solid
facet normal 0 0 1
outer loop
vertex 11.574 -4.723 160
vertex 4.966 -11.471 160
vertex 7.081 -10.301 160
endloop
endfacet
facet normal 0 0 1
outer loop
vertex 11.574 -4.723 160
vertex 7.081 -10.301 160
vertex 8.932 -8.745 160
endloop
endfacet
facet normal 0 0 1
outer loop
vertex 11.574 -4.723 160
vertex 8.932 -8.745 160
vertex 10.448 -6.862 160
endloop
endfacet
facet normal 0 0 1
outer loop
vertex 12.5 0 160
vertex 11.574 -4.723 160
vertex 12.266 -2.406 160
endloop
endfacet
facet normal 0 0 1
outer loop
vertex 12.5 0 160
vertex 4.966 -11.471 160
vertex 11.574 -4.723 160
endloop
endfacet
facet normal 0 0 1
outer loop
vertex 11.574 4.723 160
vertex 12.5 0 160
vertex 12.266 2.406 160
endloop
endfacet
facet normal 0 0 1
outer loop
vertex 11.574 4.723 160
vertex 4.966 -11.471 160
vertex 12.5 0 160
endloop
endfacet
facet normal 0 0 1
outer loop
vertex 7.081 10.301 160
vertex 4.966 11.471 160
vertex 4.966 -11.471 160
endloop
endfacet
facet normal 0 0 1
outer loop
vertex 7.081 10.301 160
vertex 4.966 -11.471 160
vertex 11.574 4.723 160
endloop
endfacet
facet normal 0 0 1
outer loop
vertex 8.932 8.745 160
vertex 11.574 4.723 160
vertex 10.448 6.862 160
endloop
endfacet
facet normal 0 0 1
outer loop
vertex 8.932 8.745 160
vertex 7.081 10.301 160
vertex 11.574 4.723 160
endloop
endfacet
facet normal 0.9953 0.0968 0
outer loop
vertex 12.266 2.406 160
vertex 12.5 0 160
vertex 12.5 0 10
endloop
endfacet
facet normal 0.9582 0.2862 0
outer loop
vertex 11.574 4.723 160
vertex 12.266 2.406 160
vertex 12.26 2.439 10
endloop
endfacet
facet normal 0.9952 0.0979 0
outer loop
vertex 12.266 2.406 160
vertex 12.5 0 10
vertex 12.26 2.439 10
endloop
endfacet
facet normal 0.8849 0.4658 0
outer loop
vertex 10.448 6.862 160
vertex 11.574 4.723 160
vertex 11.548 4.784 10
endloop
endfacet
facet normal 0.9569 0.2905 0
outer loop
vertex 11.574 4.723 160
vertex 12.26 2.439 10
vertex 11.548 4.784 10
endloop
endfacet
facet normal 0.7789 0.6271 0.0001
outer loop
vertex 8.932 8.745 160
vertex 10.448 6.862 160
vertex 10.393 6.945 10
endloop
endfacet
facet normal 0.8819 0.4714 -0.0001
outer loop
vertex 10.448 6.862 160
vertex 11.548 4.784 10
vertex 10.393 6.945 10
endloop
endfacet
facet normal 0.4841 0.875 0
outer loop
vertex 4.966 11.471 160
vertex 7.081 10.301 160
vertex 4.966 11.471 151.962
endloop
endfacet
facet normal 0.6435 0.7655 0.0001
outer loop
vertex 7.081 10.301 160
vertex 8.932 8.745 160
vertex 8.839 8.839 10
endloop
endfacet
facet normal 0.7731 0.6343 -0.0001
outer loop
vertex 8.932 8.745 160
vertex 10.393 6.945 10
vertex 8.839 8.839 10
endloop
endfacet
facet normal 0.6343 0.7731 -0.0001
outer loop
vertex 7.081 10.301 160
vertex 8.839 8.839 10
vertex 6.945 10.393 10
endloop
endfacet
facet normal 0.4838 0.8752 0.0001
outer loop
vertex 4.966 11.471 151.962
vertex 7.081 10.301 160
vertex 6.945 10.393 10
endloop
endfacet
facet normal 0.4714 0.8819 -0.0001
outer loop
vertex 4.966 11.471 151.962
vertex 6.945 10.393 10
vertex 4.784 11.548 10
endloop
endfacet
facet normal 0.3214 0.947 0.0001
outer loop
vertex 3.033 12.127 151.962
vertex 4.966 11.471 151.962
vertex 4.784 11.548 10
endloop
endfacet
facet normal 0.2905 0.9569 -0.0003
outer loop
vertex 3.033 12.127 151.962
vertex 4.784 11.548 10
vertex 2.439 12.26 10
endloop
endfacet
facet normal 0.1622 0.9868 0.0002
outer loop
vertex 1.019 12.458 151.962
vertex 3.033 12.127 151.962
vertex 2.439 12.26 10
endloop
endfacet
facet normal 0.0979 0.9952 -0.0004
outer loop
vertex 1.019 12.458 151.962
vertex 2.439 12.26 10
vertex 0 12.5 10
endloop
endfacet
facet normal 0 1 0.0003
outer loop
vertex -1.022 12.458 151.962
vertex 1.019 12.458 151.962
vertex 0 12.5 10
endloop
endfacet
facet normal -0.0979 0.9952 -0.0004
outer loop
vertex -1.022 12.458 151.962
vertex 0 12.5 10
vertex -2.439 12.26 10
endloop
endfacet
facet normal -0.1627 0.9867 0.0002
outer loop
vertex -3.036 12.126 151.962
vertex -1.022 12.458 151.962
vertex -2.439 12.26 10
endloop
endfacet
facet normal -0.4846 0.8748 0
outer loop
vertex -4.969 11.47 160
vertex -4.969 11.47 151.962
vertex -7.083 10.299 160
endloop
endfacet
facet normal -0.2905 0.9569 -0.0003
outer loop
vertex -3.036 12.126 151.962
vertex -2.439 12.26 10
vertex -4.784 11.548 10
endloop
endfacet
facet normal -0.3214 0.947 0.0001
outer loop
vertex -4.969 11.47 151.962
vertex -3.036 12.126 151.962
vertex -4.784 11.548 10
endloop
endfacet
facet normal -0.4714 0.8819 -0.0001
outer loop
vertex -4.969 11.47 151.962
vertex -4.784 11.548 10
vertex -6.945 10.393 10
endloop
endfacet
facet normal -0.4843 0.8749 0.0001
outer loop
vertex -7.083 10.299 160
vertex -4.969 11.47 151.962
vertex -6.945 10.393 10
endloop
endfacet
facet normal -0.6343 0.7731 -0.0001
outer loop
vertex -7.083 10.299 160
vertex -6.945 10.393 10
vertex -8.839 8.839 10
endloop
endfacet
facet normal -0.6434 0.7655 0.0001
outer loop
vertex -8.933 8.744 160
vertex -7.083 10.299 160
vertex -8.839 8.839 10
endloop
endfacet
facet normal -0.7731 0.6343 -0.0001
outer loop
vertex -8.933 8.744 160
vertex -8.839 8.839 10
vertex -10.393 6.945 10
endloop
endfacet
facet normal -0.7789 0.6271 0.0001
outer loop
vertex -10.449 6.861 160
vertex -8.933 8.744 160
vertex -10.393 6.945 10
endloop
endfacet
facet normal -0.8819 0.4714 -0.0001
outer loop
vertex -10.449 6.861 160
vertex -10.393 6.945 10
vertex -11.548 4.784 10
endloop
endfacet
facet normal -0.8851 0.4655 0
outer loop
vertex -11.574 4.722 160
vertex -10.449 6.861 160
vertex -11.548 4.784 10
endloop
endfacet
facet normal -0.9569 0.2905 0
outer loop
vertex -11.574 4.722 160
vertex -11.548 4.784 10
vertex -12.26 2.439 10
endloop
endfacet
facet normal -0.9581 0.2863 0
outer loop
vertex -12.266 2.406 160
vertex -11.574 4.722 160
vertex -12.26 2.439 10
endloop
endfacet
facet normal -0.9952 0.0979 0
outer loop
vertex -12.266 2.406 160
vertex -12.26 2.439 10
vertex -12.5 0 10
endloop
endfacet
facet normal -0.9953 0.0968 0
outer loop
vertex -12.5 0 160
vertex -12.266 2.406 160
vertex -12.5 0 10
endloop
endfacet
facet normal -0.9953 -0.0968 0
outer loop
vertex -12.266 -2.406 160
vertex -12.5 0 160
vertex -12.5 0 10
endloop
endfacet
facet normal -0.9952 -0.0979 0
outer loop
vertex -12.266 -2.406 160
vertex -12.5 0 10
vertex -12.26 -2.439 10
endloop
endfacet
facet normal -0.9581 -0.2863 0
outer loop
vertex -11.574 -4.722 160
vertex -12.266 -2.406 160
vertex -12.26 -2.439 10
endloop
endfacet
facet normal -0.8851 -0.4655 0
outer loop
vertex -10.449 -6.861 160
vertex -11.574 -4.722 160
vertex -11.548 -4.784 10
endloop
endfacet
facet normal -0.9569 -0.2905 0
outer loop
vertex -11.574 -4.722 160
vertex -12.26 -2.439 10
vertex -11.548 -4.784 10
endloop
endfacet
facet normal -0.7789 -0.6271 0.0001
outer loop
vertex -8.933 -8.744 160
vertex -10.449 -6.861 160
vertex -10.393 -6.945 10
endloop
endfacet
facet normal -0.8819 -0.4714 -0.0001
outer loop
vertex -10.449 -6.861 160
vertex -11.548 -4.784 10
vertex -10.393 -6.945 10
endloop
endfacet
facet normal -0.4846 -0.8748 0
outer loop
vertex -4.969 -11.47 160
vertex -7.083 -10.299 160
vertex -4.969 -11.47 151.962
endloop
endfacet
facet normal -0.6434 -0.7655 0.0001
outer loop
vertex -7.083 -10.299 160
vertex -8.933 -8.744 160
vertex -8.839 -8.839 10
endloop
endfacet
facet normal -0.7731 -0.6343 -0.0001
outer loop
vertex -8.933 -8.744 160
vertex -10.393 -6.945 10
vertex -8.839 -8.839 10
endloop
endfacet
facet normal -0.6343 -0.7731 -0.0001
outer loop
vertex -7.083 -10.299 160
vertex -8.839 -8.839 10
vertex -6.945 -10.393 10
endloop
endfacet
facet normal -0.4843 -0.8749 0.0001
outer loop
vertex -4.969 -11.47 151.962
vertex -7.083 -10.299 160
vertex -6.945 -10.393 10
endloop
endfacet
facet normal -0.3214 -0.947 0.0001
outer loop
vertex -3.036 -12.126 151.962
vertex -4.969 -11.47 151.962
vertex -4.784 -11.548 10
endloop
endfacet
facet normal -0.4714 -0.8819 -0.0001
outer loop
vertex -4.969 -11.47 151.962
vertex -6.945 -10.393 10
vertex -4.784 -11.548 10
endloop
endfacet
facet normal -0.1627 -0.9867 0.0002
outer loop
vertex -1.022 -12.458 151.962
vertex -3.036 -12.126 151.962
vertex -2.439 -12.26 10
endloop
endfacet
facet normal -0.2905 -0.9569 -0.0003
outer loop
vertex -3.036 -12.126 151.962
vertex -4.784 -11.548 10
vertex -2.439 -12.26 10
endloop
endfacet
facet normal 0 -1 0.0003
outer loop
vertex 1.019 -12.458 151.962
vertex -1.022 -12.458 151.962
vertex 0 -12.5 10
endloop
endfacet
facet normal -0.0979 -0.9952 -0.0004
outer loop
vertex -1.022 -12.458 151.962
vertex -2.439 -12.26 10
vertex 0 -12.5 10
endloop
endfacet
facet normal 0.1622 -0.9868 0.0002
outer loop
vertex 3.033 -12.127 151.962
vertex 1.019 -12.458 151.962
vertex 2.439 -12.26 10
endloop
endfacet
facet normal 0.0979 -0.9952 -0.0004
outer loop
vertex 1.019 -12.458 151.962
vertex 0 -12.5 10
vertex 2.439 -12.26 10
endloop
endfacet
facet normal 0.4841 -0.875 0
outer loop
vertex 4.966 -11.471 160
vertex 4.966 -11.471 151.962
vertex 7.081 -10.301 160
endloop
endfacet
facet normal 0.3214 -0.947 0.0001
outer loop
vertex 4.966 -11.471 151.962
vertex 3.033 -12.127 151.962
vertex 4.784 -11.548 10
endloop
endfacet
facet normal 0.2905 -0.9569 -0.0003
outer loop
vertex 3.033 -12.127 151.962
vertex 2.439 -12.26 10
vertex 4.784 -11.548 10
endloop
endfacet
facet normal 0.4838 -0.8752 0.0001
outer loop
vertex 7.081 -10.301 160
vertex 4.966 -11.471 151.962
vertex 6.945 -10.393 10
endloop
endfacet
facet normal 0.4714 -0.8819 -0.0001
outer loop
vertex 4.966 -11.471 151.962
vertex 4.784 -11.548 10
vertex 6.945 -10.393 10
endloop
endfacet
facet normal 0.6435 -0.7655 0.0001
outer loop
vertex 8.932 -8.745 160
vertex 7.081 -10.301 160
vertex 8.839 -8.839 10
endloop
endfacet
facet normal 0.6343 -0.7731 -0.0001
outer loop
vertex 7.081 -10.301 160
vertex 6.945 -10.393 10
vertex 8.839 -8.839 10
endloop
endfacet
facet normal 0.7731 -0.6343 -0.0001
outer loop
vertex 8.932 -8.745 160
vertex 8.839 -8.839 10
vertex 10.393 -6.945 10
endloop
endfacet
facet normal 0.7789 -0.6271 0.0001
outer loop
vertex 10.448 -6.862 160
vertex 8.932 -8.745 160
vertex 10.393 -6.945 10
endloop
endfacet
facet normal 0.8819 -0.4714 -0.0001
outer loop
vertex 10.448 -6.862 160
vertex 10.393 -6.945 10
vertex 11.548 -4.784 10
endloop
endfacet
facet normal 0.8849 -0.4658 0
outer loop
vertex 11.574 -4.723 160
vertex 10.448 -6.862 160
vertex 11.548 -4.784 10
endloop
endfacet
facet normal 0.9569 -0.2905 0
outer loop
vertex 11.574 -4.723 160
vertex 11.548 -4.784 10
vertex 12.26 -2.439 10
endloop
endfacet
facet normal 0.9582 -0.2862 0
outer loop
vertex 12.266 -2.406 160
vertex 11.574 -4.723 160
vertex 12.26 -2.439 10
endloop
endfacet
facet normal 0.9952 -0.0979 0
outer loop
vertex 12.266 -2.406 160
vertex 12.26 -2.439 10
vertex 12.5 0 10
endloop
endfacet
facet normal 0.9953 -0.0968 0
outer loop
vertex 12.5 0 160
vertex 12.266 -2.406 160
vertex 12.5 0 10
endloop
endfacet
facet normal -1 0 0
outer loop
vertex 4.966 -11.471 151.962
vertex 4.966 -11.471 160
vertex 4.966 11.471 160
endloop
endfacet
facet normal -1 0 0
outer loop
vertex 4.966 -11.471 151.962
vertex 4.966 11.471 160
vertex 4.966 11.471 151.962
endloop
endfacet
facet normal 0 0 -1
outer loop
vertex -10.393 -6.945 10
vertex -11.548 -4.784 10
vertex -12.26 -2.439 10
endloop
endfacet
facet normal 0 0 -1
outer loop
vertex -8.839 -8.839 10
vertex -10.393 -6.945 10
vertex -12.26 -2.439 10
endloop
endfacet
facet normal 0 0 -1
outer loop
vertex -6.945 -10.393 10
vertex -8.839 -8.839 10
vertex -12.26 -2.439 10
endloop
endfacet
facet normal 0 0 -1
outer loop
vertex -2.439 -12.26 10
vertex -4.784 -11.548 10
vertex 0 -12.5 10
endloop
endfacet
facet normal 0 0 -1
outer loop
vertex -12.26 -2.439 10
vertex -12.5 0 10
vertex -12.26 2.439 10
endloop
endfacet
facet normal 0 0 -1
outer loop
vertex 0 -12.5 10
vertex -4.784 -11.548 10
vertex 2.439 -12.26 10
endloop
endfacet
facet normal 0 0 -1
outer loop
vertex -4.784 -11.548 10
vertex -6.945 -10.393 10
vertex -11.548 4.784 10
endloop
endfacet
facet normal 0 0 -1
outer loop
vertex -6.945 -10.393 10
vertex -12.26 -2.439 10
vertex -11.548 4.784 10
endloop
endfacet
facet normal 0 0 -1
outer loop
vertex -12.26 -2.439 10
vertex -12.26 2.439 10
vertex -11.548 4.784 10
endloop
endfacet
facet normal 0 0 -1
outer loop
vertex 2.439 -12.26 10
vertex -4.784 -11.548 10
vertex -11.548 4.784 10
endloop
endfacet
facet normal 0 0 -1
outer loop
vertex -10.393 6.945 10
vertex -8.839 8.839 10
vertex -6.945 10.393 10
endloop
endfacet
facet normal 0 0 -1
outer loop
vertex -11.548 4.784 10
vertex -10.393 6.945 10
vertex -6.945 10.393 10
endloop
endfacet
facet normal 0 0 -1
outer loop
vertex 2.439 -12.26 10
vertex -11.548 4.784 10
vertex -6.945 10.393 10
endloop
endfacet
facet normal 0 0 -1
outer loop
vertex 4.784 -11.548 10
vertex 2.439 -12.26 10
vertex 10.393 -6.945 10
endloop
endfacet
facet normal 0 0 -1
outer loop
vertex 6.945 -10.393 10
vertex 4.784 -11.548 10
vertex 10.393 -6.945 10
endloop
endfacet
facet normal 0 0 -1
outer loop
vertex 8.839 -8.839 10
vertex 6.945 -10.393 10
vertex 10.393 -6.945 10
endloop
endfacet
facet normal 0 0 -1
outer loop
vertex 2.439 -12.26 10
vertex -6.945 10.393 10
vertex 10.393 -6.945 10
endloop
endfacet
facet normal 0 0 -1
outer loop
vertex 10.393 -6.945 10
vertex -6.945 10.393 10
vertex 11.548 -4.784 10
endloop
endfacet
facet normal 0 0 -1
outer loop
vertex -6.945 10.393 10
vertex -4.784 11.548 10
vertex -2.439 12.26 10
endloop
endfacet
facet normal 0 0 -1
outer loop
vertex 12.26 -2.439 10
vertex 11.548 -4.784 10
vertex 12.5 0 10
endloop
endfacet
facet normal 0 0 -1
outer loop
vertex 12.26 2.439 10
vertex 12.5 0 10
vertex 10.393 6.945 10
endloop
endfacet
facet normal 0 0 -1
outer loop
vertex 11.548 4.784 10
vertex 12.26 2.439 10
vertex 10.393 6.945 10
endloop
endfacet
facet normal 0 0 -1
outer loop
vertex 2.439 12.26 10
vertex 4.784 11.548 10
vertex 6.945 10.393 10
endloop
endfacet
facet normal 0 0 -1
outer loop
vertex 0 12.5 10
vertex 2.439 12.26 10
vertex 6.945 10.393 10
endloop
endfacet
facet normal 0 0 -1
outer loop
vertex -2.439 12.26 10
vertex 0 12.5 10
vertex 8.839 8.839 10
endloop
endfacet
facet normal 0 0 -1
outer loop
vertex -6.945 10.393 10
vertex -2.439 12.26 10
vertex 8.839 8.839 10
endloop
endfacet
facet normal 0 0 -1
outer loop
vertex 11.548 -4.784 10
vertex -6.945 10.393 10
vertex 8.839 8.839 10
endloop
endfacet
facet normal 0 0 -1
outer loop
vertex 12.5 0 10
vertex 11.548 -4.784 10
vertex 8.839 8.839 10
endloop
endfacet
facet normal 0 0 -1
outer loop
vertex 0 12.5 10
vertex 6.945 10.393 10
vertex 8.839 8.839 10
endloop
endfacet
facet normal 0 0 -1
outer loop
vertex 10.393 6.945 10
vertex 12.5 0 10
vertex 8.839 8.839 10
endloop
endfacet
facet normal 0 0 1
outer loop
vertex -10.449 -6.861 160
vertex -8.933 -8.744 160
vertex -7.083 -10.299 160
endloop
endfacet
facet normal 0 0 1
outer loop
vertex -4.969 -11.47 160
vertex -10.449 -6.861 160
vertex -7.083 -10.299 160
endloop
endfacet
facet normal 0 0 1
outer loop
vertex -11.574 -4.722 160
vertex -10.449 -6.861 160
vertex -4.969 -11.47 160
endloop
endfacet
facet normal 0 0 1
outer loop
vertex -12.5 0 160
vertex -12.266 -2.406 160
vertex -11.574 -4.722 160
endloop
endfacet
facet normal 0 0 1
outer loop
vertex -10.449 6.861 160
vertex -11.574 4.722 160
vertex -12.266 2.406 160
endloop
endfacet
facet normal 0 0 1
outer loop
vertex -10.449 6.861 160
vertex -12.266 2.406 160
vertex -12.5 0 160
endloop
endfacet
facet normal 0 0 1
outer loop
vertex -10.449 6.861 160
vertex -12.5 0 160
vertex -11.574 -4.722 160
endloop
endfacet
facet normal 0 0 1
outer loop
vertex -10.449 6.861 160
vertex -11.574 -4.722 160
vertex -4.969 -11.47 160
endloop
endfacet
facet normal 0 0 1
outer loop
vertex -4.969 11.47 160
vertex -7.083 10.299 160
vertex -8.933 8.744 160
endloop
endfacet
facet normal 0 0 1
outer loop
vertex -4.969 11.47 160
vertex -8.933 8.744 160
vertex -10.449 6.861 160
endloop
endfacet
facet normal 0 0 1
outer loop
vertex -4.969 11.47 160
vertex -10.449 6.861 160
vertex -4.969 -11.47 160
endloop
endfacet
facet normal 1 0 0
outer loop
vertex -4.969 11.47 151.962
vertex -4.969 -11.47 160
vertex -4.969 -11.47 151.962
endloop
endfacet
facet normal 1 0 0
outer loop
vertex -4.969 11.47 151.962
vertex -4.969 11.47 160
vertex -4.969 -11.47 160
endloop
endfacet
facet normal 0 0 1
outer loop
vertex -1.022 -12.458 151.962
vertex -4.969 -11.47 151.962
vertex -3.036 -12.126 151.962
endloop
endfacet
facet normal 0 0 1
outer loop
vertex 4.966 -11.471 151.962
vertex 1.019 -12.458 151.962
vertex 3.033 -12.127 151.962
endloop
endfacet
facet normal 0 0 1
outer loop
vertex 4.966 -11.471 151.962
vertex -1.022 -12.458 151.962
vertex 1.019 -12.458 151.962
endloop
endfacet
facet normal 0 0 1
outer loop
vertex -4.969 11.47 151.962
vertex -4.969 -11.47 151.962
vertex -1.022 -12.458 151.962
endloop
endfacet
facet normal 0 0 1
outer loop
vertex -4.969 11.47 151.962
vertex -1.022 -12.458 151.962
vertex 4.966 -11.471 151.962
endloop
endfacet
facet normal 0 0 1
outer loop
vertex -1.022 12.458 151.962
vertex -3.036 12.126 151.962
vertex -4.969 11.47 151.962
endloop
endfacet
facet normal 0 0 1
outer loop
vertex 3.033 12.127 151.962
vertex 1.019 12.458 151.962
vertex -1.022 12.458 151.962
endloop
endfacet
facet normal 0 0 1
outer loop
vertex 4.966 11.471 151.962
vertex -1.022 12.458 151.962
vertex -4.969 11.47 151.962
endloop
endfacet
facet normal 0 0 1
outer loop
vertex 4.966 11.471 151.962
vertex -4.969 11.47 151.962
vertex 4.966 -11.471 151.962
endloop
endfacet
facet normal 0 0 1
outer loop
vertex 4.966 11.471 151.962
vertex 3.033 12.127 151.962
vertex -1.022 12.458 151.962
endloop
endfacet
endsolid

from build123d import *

# Parameters (mm, degrees)
EXTRUDE_START       = 10
SKETCH_1_R          = 12.5
EXTRUDE_1_DEPTH     = 150
SKETCH_2_W          = 9.934119033
SKETCH_2_H          = 36.471756902
CUT_EXTRUDE_1_DEPTH = 35


with BuildPart() as part:
    # Эскиз1 → Вытянуть1 (new body)
    with BuildSketch(Plane.XY.offset(EXTRUDE_START)):
        Circle(SKETCH_1_R)
    extrude(amount=EXTRUDE_1_DEPTH)

    # Эскиз2 → Вырез-Вытянуть1 (cut, symmetric)
    with BuildSketch(Plane(origin=(0, 0, 0), x_dir=(1, 0, 0), z_dir=(0, 1, 0))):
        with Locations((-0.001487871, -170.197950686)):
            Rectangle(SKETCH_2_W, SKETCH_2_H)
    extrude(amount=CUT_EXTRUDE_1_DEPTH, both=True, mode=Mode.SUBTRACT)


solid = part.part
